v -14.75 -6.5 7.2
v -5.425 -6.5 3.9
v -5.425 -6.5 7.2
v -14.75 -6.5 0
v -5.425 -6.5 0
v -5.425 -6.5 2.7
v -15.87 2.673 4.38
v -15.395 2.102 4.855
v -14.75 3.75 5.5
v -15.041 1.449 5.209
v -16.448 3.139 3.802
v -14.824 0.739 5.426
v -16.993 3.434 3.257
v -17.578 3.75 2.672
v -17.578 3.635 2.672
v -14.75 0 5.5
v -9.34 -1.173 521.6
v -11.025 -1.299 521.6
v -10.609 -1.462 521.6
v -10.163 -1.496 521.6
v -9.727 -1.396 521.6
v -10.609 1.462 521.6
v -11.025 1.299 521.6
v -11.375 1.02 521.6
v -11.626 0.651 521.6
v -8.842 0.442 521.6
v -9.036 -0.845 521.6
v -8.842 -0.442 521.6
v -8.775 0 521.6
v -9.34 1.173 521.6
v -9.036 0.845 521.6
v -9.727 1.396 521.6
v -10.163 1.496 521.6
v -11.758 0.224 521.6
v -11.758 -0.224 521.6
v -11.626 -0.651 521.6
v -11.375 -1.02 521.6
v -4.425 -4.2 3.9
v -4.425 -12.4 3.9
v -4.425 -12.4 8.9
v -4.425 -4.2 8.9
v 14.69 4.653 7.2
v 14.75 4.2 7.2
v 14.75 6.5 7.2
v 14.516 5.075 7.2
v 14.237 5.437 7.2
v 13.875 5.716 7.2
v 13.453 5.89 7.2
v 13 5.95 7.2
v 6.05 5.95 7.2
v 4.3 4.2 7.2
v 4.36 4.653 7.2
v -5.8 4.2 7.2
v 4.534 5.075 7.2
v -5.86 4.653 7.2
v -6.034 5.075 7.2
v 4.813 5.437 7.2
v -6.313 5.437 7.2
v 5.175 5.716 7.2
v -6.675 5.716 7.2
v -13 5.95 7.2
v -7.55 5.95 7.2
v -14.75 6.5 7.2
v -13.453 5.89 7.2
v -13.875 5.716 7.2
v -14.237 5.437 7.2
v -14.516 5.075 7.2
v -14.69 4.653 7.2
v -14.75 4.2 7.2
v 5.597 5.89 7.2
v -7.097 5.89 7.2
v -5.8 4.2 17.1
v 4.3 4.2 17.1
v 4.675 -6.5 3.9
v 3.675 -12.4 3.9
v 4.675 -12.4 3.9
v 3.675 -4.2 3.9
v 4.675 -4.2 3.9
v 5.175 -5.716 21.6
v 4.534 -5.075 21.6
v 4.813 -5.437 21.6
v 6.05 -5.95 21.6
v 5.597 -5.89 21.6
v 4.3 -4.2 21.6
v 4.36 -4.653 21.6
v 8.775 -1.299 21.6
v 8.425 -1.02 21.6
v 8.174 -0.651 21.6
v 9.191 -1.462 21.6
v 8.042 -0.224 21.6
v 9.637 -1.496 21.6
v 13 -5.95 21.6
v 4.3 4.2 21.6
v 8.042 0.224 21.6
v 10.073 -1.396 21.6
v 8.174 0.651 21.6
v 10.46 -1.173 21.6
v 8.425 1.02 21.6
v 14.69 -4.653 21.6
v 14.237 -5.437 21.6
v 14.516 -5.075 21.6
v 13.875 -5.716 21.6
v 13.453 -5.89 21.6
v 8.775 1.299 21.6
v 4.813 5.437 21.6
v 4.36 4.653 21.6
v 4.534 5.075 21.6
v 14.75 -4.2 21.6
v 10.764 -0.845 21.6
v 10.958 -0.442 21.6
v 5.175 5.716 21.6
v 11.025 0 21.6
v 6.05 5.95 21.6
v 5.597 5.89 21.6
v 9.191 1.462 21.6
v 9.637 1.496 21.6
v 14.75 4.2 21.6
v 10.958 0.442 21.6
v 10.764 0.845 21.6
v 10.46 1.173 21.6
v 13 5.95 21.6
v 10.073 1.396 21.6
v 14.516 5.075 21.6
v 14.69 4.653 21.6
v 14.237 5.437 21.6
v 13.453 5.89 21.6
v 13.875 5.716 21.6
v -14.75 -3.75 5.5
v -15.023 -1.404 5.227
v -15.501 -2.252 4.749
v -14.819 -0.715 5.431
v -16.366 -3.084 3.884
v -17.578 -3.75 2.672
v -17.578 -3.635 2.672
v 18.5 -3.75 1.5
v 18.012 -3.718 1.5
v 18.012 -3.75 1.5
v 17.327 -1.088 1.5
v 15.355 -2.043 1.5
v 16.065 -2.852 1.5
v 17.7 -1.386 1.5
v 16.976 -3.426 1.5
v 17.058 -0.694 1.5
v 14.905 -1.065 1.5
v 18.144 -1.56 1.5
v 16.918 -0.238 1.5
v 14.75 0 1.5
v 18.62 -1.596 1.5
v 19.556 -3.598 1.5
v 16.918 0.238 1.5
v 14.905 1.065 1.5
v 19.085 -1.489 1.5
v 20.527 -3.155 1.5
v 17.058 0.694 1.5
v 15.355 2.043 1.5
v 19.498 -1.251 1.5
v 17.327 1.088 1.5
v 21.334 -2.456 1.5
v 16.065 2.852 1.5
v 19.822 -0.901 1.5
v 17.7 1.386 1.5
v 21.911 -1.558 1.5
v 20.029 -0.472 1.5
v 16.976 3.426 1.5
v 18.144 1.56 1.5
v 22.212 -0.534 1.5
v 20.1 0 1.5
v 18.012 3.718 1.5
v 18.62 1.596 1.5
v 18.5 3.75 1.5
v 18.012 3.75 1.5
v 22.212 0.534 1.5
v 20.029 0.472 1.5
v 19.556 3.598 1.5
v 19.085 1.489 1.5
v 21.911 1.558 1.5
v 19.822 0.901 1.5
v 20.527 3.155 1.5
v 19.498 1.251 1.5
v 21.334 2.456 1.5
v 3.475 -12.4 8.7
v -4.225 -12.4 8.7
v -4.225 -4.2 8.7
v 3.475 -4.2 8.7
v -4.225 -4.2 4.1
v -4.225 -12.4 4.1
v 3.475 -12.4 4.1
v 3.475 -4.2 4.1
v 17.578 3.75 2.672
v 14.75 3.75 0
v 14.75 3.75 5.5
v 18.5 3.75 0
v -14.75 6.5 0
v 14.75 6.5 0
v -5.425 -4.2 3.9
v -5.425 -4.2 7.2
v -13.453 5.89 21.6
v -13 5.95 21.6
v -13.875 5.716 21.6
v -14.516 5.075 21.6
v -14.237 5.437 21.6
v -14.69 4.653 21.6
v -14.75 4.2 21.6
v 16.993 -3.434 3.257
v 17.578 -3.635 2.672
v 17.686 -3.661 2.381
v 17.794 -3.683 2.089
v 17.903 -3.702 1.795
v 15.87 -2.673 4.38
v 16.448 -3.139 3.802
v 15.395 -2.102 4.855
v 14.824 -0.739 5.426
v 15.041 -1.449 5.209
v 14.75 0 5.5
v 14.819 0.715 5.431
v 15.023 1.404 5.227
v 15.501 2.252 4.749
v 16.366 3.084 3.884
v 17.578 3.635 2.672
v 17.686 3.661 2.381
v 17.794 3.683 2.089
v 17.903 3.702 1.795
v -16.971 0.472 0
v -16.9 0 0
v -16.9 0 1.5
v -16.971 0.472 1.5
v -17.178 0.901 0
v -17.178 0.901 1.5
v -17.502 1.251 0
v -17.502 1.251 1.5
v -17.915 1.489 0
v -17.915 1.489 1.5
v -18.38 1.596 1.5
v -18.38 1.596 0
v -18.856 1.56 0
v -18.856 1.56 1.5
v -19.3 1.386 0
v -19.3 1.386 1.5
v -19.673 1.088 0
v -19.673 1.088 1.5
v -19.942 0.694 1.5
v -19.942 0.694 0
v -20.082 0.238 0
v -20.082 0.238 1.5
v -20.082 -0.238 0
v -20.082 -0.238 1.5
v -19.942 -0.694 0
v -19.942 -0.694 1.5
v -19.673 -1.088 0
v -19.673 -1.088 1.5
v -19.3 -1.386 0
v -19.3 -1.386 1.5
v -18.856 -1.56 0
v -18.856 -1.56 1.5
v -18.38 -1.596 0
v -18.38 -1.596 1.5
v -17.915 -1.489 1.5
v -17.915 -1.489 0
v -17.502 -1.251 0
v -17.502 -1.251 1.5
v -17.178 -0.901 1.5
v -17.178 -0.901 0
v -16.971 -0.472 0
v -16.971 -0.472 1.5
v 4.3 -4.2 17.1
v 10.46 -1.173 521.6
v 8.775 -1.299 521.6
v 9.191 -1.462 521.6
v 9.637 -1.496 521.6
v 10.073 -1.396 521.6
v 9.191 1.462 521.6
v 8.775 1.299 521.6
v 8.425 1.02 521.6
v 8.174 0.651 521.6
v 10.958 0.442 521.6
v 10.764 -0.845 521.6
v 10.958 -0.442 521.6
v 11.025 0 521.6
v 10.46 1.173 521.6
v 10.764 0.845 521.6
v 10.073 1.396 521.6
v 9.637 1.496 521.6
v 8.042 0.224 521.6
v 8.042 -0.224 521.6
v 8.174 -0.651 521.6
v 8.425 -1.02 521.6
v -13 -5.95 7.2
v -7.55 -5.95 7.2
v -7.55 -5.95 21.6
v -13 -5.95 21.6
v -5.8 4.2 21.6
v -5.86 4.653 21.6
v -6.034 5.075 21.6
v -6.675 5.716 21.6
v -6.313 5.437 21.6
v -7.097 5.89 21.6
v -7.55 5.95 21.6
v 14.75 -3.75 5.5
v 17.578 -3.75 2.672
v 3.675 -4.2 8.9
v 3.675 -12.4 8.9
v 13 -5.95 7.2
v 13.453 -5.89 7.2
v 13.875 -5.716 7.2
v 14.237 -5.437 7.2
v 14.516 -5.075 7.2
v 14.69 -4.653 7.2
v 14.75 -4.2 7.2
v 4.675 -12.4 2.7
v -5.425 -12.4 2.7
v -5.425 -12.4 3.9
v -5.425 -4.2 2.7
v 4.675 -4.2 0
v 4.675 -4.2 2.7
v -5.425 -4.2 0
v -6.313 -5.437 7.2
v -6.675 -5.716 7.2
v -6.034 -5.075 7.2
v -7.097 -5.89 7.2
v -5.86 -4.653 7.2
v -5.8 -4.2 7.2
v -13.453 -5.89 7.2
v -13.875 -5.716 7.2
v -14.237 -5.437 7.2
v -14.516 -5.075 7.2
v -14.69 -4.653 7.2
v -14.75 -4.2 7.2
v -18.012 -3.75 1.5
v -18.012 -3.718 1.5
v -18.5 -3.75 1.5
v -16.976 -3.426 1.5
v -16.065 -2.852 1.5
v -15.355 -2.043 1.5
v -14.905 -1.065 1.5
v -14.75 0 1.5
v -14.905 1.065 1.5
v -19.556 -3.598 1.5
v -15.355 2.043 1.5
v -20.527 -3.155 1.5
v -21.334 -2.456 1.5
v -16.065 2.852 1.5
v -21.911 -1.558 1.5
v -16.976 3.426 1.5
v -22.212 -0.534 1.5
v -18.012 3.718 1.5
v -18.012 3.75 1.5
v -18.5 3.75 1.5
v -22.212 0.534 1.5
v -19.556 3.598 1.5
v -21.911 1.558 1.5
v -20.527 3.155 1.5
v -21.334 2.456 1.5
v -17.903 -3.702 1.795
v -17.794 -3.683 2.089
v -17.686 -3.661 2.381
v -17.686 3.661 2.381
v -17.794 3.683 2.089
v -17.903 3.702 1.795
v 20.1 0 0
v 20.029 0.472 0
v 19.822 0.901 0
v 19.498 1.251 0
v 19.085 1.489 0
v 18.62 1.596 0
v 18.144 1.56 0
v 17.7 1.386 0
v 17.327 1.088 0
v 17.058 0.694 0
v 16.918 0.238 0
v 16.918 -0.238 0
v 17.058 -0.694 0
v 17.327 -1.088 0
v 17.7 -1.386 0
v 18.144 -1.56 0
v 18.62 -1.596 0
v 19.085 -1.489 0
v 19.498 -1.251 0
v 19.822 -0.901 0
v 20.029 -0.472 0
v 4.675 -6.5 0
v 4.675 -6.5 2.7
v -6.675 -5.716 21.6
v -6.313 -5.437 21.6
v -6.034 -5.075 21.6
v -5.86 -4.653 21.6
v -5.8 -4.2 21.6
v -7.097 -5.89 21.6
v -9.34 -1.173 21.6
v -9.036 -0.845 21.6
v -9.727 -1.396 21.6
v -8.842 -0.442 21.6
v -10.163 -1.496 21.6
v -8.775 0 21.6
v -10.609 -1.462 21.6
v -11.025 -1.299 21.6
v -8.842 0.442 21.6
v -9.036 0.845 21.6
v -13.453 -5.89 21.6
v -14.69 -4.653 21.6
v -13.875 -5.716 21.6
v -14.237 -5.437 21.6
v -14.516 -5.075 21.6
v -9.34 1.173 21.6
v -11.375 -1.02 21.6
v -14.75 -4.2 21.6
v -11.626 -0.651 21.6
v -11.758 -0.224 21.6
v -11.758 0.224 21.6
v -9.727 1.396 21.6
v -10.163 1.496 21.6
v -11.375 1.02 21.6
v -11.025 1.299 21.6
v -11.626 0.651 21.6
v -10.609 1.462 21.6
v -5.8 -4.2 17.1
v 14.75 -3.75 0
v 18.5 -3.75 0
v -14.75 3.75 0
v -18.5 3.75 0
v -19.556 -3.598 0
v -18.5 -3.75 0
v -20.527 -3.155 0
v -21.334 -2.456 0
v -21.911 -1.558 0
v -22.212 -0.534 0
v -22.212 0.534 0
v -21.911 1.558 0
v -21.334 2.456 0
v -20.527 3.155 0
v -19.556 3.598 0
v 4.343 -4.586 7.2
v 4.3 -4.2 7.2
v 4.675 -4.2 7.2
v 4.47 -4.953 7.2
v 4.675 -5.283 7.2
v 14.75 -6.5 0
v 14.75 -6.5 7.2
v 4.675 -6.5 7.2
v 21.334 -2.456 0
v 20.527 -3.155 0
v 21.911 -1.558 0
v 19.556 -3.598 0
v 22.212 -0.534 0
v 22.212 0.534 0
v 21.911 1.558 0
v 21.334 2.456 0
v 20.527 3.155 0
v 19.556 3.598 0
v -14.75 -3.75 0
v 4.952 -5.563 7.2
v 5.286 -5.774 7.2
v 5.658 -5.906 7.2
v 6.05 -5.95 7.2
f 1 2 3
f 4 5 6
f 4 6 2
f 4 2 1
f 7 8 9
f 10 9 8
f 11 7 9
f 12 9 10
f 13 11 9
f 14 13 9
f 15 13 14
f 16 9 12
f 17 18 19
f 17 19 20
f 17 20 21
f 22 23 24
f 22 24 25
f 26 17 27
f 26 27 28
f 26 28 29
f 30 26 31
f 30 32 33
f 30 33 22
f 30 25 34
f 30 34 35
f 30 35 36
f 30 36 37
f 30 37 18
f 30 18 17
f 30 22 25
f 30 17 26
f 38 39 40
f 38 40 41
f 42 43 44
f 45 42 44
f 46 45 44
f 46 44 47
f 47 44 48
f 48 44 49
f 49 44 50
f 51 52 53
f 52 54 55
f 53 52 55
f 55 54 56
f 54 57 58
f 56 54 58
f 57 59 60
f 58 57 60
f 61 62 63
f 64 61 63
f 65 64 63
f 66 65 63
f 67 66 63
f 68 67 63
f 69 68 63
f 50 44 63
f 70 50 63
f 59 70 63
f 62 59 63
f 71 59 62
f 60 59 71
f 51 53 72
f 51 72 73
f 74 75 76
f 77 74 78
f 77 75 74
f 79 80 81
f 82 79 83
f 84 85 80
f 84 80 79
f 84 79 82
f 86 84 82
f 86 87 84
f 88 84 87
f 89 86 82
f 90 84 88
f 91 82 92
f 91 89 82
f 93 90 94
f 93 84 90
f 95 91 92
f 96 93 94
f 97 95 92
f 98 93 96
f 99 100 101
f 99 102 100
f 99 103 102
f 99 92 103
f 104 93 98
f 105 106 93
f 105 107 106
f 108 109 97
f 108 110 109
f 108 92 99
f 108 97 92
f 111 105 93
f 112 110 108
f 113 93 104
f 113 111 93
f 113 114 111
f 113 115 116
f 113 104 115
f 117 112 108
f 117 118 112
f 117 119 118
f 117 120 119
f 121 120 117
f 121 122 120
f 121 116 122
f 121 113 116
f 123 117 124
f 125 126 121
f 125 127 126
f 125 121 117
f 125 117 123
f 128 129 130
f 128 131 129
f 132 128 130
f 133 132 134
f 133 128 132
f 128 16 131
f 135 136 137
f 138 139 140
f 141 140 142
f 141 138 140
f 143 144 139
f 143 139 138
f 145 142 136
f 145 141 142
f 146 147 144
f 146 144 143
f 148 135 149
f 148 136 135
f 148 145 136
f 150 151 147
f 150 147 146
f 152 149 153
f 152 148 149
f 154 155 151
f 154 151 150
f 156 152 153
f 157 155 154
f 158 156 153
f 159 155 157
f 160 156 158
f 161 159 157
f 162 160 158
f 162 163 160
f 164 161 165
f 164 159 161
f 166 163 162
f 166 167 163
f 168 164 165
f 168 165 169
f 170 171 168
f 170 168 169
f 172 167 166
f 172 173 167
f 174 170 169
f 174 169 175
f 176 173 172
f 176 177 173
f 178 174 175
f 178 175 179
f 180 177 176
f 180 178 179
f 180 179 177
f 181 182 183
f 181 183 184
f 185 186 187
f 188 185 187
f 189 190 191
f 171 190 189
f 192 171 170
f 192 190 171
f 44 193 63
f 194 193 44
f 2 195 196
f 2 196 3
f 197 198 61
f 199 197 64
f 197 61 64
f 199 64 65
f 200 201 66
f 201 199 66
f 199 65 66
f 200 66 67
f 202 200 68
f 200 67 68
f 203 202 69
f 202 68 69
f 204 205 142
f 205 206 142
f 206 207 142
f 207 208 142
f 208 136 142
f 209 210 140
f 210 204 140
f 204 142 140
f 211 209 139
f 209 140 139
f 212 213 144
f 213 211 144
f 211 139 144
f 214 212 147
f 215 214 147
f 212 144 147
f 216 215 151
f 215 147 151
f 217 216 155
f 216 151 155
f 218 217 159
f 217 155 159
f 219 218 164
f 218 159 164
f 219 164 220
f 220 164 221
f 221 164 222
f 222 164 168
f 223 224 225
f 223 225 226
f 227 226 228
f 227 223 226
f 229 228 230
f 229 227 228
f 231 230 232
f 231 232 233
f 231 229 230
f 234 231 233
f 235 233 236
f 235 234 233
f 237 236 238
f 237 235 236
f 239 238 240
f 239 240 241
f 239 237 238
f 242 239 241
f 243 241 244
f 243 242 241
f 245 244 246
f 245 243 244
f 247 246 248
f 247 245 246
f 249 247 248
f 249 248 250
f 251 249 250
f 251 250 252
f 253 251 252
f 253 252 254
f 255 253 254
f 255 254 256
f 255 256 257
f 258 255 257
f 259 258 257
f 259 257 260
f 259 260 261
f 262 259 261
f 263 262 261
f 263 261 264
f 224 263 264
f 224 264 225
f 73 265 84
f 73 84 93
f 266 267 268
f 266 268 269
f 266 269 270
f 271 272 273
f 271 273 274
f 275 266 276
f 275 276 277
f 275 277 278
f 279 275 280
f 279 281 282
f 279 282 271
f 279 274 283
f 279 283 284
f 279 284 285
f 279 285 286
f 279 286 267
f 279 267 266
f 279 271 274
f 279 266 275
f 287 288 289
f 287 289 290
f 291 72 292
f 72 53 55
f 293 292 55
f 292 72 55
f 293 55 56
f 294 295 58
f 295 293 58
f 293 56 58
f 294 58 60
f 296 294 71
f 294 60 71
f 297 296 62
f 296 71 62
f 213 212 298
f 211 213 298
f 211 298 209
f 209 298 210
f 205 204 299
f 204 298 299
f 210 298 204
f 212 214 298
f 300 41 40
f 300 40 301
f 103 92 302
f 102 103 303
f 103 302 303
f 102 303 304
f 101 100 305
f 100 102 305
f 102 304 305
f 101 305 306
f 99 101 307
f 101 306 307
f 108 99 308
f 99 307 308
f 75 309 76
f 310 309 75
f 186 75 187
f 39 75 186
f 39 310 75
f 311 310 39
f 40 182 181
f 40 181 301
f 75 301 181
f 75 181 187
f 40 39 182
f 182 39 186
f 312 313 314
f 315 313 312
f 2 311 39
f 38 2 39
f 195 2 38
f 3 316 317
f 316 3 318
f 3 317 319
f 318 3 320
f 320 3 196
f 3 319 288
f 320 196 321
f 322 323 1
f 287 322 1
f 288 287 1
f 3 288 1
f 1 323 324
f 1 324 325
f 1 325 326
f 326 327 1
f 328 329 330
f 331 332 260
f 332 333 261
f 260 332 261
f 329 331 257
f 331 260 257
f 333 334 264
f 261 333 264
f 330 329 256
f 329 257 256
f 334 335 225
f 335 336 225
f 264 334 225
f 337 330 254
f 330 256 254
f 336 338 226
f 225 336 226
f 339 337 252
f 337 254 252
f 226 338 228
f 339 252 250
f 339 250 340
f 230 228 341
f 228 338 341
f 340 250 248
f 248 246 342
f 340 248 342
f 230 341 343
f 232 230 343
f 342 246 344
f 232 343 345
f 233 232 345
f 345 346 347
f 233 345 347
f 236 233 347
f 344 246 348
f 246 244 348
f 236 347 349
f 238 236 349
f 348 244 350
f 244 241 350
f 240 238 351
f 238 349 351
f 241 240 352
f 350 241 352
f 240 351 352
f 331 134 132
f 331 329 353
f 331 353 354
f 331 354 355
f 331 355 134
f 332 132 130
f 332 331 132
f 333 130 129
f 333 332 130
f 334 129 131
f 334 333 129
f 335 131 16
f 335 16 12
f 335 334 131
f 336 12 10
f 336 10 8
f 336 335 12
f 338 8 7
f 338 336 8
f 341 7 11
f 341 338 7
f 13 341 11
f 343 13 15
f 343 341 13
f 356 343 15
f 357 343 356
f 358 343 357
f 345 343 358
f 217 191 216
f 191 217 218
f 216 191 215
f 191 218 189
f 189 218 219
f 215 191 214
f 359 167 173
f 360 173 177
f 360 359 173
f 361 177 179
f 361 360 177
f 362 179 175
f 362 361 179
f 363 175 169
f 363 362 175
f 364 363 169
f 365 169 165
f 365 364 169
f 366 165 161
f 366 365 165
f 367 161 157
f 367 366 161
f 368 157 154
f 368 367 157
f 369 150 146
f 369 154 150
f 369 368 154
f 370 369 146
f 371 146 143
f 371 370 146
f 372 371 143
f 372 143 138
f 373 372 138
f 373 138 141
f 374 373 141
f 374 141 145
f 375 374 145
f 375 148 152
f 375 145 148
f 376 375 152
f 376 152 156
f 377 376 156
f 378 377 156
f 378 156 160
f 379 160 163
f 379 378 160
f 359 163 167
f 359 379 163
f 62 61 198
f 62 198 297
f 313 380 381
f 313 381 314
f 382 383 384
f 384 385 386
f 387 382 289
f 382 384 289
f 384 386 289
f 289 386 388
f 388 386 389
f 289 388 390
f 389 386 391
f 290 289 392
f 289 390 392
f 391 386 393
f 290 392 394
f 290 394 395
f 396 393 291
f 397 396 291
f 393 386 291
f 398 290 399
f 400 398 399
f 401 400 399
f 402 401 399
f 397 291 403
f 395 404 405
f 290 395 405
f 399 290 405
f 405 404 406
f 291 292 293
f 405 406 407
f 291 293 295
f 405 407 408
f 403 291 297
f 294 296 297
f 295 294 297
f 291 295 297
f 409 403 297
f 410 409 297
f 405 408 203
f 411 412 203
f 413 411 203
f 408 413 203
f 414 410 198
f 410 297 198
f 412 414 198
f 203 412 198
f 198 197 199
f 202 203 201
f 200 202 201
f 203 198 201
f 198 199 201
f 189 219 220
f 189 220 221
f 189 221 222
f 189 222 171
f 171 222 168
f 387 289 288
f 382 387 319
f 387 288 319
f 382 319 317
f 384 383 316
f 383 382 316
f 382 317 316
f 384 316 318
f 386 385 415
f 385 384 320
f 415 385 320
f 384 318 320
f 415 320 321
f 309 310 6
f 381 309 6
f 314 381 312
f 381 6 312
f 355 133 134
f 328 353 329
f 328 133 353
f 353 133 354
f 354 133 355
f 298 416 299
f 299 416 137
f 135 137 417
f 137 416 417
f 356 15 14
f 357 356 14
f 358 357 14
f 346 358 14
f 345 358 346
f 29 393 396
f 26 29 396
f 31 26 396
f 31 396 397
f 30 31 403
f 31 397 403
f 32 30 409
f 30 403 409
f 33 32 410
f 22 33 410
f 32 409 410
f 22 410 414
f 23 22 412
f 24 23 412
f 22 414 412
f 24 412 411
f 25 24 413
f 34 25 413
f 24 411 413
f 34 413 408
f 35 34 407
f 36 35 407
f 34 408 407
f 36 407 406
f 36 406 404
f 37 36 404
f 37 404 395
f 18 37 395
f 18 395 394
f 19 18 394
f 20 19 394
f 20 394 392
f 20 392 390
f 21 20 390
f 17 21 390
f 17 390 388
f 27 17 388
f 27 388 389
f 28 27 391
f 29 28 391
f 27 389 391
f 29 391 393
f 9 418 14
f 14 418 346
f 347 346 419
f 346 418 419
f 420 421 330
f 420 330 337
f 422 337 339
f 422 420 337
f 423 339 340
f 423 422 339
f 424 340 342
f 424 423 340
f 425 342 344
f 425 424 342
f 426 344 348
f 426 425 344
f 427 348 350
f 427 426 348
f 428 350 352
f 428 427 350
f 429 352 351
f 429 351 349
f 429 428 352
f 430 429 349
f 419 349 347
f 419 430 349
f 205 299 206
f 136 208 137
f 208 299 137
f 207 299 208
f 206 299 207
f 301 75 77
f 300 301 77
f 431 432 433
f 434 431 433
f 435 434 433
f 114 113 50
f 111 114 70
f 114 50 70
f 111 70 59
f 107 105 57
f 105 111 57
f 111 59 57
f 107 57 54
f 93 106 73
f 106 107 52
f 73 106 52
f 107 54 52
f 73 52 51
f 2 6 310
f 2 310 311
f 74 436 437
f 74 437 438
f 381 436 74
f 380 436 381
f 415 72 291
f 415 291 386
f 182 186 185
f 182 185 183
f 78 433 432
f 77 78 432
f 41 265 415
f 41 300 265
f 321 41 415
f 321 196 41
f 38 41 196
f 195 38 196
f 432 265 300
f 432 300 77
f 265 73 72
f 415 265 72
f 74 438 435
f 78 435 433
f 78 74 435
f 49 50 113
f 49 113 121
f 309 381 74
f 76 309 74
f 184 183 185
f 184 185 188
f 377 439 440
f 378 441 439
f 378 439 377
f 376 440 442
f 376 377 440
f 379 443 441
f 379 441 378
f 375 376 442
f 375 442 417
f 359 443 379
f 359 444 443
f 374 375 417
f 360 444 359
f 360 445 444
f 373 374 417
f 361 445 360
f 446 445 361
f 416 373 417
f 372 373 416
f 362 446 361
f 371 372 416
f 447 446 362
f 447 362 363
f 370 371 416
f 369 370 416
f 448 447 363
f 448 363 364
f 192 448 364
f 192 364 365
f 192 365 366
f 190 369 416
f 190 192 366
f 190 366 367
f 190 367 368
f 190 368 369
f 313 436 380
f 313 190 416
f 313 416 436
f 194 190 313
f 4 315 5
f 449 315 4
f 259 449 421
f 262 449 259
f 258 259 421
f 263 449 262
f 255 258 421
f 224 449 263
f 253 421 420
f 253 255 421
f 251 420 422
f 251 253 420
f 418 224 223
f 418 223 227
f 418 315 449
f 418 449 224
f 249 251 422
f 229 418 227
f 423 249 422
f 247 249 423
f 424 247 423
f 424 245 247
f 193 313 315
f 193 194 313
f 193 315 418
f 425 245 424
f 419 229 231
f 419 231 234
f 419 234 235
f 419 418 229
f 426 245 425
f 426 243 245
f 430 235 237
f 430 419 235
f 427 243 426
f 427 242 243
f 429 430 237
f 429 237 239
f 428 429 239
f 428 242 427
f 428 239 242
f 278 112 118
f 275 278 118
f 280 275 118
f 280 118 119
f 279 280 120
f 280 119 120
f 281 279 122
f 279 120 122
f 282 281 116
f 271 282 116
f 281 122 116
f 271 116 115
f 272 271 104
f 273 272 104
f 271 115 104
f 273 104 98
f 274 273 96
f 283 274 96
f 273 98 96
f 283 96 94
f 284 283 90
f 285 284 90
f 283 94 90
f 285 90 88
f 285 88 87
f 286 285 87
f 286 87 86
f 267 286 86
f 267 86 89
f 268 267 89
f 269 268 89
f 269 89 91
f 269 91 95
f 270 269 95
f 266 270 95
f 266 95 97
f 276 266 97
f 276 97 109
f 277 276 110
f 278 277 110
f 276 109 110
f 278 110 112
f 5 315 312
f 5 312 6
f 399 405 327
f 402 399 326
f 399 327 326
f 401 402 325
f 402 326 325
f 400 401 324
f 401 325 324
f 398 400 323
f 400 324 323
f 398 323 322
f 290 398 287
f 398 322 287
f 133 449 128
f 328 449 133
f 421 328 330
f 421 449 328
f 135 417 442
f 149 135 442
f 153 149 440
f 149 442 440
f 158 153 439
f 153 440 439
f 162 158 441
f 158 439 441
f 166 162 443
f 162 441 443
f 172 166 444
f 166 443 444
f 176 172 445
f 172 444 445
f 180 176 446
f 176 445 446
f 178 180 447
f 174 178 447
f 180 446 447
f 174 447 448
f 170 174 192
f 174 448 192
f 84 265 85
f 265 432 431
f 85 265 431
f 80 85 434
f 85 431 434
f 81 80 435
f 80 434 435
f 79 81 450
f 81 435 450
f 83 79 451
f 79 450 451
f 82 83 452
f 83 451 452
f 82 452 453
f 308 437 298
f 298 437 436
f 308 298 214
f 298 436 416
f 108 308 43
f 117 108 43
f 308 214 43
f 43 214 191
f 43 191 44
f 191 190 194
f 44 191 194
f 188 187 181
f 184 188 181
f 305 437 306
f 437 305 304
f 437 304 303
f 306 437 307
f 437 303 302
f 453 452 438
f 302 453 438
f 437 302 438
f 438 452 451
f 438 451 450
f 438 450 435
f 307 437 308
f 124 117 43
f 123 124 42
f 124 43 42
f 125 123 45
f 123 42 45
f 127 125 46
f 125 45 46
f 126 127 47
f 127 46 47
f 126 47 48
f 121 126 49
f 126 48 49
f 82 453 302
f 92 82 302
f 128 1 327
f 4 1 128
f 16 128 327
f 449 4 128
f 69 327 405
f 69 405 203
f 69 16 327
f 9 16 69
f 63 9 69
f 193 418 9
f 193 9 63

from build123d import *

# Parameters (mm, degrees)
EXTRUDE_1_DEPTH     = 7.2
SKETCH_2_R          = 1.6
EXTRUDE_2_DEPTH     = 1.5
EXTRUDE_START       = -7.5
EXTRUDE_3_DEPTH     = 7.5
EXTRUDE_4_DEPTH     = 10.1
SKETCH_7_R          = 3.75
CUT_EXTRUDE_3_DEPTH = 21.5
SKETCH_8_W          = 10.45
SKETCH_8_H          = 11.9
EXTRUDE_5_DEPTH     = 14.4
FILLET_1_R          = 1.75
EXTRUDE_6_DEPTH     = 9.9
SKETCH_10_W         = 8.1
SKETCH_10_H         = 8.2
EXTRUDE_7_DEPTH     = 5
SKETCH_11_W         = 7.7
SKETCH_11_H         = 4.6
CUT_EXTRUDE_4_DEPTH = 8.2
SKETCH_13_R         = 1.5
EXTRUDE_9_DEPTH     = 500


with BuildPart() as part:
    # 草图1 → 凸台-拉伸1 (new body)
    with BuildSketch(Plane.XY):
        Polygon((14.75, -6.5), (4.675, -6.5), (4.675, -4.2), (-5.425, -4.2), (-5.425, -6.5), (-14.75, -6.5), (-14.75, 6.5), (14.75, 6.5), align=None)
    extrude(amount=EXTRUDE_1_DEPTH)

    # 草图2 → 凸台-拉伸2 (add)
    # profile 1 of 2: a face of its own
    with BuildSketch(Plane.XY):
        with BuildLine():
            Line((-18.5, 3.75), (-14.75, 3.75))
            Line((-14.75, 3.75), (-14.75, -3.75))
            Line((-14.75, -3.75), (-18.5, -3.75))
            ThreePointArc((-18.5, -3.75), (-22.25, 0), (-18.5, 3.75))
        make_face()
        with Locations((-18.5, 0)):
            Circle(SKETCH_2_R, mode=Mode.SUBTRACT)
    # profile 2 of 2: a face of its own
    with BuildSketch(Plane.XY):
        with BuildLine():
            Line((18.5, 3.75), (14.75, 3.75))
            Line((14.75, 3.75), (14.75, 0))
            Line((14.75, 0), (14.75, -3.75))
            Line((14.75, -3.75), (18.5, -3.75))
            ThreePointArc((18.5, -3.75), (22.25, 0), (18.5, 3.75))
        make_face()
        with Locations((18.5, 0)):
            Circle(SKETCH_2_R, mode=Mode.SUBTRACT)
    extrude(amount=EXTRUDE_2_DEPTH)

    # 草图3 → 凸台-拉伸3 (add)
    with BuildSketch(Plane(origin=(0, 3.75, 0), x_dir=(1, 0, 0), z_dir=(0, 1, 0)).offset(EXTRUDE_START)):
        Polygon((-14.75, -1.5), (-14.75, -5.5), (-17.578427125, -2.671572875), (-18.012250402, -1.5), align=None)
    extrude_3 = extrude(amount=EXTRUDE_3_DEPTH)

    # 草图5 → 凸台-拉伸4 (add)
    with BuildSketch(Plane(origin=(-5.425, 0, 0), x_dir=(0, 0, -1), z_dir=(1, 0, 0))):
        Polygon((-3.9, -4.2), (-2.7, -4.2), (-2.7, -6.5), (-2.7, -12.4), (-3.9, -12.4), align=None)
    extrude(amount=EXTRUDE_4_DEPTH)

    # 草图7 → 切除-拉伸3 (cut)
    with BuildSketch(Plane.XY.offset(1.5)):
        with Locations((-18.5, 0)):
            Circle(SKETCH_7_R)
        with BuildLine():
            Line((-18.012250402, 1.523843932), (-18.012250402, -1.523843932))
            ThreePointArc((-18.012250402, -1.523843932), (-20.1, 0), (-18.012250402, 1.523843932))
        make_face(mode=Mode.SUBTRACT)
    cut_extrude_3 = extrude(amount=CUT_EXTRUDE_3_DEPTH, mode=Mode.SUBTRACT)

    # 镜向2: 凸台-拉伸3, 切除-拉伸3 across plane
    add(extrude_3.mirror(Plane(origin=(0, 0, 0), x_dir=(0, 0, 1), z_dir=(1, 0, 0))))
    add(cut_extrude_3.mirror(Plane(origin=(0, 0, 0), x_dir=(0, 0, 1), z_dir=(1, 0, 0))), mode=Mode.SUBTRACT)

    # 草图8 → 凸台-拉伸5 (add)
    with BuildSketch(Plane.XY.offset(7.2)):
        Polygon((-14.75, 0), (-14.75, 5.95), (-5.8, 5.95), (-5.8, -5.95), (-14.75, -5.95), align=None)
        with Locations((9.525, 0)):
            Rectangle(SKETCH_8_W, SKETCH_8_H)
    extrude(amount=EXTRUDE_5_DEPTH)

    # 圆角1
    # the kernel refuses this fillet: 1.75 mm, written as the material it takes off along each edge
    with BuildSketch(Plane(origin=(-14.75, -5.95, 7.2), x_dir=(0, 1, 0), z_dir=(0, 0, 1)), Plane(origin=(14.75, 5.95, 7.2), x_dir=(0, -1, 0), z_dir=(0, 0, 1))) as fillet_1_piece_1:
        with BuildLine():
            CenterArc((FILLET_1_R, -FILLET_1_R), FILLET_1_R, 90, 90)
            Line((0, -FILLET_1_R), (0, 0))
            Line((0, 0), (FILLET_1_R, 0))
        make_face()
    extrude(amount=18.775, mode=Mode.SUBTRACT)
    with BuildSketch(Plane(origin=(-5.8, -5.95, 7.2), x_dir=(0, 1, 0), z_dir=(0, 0, 1)), Plane(origin=(-5.8, 5.95, 7.2), x_dir=(-1, 0, 0), z_dir=(0, 0, 1)), Plane(origin=(-14.75, 5.95, 7.2), x_dir=(0, -1, 0), z_dir=(0, 0, 1)), Plane(origin=(14.75, -5.95, 7.2), x_dir=(0, 1, 0), z_dir=(0, 0, 1)), Plane(origin=(4.3, 5.95, 7.2), x_dir=(0, -1, 0), z_dir=(0, 0, 1)), Plane(origin=(4.3, -5.95, 7.2), x_dir=(1, 0, 0), z_dir=(0, 0, 1))) as fillet_1_piece_2:
        with BuildLine():
            CenterArc((FILLET_1_R, FILLET_1_R), FILLET_1_R, 180, 90)
            Line((0, FILLET_1_R), (0, 0))
            Line((0, 0), (FILLET_1_R, 0))
        make_face()
    extrude(amount=18.775, mode=Mode.SUBTRACT)

    # 草图9 → 凸台-拉伸6 (add)
    with BuildSketch(Plane.XY.offset(7.2)):
        Polygon((-5.8, 0), (-5.8, 4.2), (4.3, 4.2), (4.3, -4.2), (-5.8, -4.2), align=None)
    extrude(amount=EXTRUDE_6_DEPTH)

    # 草图10 → 凸台-拉伸7 (add)
    with BuildSketch(Plane.XY.offset(3.9)):
        with Locations((-0.375, -8.3)):
            Rectangle(SKETCH_10_W, SKETCH_10_H)
    extrude(amount=EXTRUDE_7_DEPTH)

    # 草图11 → 切除-拉伸4 (cut)
    with BuildSketch(Plane.XZ.offset(12.4)):
        with Locations((-0.375, 6.4)):
            Rectangle(SKETCH_11_W, SKETCH_11_H)
    extrude(amount=-CUT_EXTRUDE_4_DEPTH, mode=Mode.SUBTRACT)

    # 草图13 → 凸台-拉伸9 (add)
    with BuildSketch(Plane.XY.offset(21.6)):
        with Locations((-10.275, 0)):
            Circle(SKETCH_13_R)
        with Locations((9.525, 0)):
            Circle(SKETCH_13_R)
    extrude(amount=EXTRUDE_9_DEPTH)


solid = part.part
